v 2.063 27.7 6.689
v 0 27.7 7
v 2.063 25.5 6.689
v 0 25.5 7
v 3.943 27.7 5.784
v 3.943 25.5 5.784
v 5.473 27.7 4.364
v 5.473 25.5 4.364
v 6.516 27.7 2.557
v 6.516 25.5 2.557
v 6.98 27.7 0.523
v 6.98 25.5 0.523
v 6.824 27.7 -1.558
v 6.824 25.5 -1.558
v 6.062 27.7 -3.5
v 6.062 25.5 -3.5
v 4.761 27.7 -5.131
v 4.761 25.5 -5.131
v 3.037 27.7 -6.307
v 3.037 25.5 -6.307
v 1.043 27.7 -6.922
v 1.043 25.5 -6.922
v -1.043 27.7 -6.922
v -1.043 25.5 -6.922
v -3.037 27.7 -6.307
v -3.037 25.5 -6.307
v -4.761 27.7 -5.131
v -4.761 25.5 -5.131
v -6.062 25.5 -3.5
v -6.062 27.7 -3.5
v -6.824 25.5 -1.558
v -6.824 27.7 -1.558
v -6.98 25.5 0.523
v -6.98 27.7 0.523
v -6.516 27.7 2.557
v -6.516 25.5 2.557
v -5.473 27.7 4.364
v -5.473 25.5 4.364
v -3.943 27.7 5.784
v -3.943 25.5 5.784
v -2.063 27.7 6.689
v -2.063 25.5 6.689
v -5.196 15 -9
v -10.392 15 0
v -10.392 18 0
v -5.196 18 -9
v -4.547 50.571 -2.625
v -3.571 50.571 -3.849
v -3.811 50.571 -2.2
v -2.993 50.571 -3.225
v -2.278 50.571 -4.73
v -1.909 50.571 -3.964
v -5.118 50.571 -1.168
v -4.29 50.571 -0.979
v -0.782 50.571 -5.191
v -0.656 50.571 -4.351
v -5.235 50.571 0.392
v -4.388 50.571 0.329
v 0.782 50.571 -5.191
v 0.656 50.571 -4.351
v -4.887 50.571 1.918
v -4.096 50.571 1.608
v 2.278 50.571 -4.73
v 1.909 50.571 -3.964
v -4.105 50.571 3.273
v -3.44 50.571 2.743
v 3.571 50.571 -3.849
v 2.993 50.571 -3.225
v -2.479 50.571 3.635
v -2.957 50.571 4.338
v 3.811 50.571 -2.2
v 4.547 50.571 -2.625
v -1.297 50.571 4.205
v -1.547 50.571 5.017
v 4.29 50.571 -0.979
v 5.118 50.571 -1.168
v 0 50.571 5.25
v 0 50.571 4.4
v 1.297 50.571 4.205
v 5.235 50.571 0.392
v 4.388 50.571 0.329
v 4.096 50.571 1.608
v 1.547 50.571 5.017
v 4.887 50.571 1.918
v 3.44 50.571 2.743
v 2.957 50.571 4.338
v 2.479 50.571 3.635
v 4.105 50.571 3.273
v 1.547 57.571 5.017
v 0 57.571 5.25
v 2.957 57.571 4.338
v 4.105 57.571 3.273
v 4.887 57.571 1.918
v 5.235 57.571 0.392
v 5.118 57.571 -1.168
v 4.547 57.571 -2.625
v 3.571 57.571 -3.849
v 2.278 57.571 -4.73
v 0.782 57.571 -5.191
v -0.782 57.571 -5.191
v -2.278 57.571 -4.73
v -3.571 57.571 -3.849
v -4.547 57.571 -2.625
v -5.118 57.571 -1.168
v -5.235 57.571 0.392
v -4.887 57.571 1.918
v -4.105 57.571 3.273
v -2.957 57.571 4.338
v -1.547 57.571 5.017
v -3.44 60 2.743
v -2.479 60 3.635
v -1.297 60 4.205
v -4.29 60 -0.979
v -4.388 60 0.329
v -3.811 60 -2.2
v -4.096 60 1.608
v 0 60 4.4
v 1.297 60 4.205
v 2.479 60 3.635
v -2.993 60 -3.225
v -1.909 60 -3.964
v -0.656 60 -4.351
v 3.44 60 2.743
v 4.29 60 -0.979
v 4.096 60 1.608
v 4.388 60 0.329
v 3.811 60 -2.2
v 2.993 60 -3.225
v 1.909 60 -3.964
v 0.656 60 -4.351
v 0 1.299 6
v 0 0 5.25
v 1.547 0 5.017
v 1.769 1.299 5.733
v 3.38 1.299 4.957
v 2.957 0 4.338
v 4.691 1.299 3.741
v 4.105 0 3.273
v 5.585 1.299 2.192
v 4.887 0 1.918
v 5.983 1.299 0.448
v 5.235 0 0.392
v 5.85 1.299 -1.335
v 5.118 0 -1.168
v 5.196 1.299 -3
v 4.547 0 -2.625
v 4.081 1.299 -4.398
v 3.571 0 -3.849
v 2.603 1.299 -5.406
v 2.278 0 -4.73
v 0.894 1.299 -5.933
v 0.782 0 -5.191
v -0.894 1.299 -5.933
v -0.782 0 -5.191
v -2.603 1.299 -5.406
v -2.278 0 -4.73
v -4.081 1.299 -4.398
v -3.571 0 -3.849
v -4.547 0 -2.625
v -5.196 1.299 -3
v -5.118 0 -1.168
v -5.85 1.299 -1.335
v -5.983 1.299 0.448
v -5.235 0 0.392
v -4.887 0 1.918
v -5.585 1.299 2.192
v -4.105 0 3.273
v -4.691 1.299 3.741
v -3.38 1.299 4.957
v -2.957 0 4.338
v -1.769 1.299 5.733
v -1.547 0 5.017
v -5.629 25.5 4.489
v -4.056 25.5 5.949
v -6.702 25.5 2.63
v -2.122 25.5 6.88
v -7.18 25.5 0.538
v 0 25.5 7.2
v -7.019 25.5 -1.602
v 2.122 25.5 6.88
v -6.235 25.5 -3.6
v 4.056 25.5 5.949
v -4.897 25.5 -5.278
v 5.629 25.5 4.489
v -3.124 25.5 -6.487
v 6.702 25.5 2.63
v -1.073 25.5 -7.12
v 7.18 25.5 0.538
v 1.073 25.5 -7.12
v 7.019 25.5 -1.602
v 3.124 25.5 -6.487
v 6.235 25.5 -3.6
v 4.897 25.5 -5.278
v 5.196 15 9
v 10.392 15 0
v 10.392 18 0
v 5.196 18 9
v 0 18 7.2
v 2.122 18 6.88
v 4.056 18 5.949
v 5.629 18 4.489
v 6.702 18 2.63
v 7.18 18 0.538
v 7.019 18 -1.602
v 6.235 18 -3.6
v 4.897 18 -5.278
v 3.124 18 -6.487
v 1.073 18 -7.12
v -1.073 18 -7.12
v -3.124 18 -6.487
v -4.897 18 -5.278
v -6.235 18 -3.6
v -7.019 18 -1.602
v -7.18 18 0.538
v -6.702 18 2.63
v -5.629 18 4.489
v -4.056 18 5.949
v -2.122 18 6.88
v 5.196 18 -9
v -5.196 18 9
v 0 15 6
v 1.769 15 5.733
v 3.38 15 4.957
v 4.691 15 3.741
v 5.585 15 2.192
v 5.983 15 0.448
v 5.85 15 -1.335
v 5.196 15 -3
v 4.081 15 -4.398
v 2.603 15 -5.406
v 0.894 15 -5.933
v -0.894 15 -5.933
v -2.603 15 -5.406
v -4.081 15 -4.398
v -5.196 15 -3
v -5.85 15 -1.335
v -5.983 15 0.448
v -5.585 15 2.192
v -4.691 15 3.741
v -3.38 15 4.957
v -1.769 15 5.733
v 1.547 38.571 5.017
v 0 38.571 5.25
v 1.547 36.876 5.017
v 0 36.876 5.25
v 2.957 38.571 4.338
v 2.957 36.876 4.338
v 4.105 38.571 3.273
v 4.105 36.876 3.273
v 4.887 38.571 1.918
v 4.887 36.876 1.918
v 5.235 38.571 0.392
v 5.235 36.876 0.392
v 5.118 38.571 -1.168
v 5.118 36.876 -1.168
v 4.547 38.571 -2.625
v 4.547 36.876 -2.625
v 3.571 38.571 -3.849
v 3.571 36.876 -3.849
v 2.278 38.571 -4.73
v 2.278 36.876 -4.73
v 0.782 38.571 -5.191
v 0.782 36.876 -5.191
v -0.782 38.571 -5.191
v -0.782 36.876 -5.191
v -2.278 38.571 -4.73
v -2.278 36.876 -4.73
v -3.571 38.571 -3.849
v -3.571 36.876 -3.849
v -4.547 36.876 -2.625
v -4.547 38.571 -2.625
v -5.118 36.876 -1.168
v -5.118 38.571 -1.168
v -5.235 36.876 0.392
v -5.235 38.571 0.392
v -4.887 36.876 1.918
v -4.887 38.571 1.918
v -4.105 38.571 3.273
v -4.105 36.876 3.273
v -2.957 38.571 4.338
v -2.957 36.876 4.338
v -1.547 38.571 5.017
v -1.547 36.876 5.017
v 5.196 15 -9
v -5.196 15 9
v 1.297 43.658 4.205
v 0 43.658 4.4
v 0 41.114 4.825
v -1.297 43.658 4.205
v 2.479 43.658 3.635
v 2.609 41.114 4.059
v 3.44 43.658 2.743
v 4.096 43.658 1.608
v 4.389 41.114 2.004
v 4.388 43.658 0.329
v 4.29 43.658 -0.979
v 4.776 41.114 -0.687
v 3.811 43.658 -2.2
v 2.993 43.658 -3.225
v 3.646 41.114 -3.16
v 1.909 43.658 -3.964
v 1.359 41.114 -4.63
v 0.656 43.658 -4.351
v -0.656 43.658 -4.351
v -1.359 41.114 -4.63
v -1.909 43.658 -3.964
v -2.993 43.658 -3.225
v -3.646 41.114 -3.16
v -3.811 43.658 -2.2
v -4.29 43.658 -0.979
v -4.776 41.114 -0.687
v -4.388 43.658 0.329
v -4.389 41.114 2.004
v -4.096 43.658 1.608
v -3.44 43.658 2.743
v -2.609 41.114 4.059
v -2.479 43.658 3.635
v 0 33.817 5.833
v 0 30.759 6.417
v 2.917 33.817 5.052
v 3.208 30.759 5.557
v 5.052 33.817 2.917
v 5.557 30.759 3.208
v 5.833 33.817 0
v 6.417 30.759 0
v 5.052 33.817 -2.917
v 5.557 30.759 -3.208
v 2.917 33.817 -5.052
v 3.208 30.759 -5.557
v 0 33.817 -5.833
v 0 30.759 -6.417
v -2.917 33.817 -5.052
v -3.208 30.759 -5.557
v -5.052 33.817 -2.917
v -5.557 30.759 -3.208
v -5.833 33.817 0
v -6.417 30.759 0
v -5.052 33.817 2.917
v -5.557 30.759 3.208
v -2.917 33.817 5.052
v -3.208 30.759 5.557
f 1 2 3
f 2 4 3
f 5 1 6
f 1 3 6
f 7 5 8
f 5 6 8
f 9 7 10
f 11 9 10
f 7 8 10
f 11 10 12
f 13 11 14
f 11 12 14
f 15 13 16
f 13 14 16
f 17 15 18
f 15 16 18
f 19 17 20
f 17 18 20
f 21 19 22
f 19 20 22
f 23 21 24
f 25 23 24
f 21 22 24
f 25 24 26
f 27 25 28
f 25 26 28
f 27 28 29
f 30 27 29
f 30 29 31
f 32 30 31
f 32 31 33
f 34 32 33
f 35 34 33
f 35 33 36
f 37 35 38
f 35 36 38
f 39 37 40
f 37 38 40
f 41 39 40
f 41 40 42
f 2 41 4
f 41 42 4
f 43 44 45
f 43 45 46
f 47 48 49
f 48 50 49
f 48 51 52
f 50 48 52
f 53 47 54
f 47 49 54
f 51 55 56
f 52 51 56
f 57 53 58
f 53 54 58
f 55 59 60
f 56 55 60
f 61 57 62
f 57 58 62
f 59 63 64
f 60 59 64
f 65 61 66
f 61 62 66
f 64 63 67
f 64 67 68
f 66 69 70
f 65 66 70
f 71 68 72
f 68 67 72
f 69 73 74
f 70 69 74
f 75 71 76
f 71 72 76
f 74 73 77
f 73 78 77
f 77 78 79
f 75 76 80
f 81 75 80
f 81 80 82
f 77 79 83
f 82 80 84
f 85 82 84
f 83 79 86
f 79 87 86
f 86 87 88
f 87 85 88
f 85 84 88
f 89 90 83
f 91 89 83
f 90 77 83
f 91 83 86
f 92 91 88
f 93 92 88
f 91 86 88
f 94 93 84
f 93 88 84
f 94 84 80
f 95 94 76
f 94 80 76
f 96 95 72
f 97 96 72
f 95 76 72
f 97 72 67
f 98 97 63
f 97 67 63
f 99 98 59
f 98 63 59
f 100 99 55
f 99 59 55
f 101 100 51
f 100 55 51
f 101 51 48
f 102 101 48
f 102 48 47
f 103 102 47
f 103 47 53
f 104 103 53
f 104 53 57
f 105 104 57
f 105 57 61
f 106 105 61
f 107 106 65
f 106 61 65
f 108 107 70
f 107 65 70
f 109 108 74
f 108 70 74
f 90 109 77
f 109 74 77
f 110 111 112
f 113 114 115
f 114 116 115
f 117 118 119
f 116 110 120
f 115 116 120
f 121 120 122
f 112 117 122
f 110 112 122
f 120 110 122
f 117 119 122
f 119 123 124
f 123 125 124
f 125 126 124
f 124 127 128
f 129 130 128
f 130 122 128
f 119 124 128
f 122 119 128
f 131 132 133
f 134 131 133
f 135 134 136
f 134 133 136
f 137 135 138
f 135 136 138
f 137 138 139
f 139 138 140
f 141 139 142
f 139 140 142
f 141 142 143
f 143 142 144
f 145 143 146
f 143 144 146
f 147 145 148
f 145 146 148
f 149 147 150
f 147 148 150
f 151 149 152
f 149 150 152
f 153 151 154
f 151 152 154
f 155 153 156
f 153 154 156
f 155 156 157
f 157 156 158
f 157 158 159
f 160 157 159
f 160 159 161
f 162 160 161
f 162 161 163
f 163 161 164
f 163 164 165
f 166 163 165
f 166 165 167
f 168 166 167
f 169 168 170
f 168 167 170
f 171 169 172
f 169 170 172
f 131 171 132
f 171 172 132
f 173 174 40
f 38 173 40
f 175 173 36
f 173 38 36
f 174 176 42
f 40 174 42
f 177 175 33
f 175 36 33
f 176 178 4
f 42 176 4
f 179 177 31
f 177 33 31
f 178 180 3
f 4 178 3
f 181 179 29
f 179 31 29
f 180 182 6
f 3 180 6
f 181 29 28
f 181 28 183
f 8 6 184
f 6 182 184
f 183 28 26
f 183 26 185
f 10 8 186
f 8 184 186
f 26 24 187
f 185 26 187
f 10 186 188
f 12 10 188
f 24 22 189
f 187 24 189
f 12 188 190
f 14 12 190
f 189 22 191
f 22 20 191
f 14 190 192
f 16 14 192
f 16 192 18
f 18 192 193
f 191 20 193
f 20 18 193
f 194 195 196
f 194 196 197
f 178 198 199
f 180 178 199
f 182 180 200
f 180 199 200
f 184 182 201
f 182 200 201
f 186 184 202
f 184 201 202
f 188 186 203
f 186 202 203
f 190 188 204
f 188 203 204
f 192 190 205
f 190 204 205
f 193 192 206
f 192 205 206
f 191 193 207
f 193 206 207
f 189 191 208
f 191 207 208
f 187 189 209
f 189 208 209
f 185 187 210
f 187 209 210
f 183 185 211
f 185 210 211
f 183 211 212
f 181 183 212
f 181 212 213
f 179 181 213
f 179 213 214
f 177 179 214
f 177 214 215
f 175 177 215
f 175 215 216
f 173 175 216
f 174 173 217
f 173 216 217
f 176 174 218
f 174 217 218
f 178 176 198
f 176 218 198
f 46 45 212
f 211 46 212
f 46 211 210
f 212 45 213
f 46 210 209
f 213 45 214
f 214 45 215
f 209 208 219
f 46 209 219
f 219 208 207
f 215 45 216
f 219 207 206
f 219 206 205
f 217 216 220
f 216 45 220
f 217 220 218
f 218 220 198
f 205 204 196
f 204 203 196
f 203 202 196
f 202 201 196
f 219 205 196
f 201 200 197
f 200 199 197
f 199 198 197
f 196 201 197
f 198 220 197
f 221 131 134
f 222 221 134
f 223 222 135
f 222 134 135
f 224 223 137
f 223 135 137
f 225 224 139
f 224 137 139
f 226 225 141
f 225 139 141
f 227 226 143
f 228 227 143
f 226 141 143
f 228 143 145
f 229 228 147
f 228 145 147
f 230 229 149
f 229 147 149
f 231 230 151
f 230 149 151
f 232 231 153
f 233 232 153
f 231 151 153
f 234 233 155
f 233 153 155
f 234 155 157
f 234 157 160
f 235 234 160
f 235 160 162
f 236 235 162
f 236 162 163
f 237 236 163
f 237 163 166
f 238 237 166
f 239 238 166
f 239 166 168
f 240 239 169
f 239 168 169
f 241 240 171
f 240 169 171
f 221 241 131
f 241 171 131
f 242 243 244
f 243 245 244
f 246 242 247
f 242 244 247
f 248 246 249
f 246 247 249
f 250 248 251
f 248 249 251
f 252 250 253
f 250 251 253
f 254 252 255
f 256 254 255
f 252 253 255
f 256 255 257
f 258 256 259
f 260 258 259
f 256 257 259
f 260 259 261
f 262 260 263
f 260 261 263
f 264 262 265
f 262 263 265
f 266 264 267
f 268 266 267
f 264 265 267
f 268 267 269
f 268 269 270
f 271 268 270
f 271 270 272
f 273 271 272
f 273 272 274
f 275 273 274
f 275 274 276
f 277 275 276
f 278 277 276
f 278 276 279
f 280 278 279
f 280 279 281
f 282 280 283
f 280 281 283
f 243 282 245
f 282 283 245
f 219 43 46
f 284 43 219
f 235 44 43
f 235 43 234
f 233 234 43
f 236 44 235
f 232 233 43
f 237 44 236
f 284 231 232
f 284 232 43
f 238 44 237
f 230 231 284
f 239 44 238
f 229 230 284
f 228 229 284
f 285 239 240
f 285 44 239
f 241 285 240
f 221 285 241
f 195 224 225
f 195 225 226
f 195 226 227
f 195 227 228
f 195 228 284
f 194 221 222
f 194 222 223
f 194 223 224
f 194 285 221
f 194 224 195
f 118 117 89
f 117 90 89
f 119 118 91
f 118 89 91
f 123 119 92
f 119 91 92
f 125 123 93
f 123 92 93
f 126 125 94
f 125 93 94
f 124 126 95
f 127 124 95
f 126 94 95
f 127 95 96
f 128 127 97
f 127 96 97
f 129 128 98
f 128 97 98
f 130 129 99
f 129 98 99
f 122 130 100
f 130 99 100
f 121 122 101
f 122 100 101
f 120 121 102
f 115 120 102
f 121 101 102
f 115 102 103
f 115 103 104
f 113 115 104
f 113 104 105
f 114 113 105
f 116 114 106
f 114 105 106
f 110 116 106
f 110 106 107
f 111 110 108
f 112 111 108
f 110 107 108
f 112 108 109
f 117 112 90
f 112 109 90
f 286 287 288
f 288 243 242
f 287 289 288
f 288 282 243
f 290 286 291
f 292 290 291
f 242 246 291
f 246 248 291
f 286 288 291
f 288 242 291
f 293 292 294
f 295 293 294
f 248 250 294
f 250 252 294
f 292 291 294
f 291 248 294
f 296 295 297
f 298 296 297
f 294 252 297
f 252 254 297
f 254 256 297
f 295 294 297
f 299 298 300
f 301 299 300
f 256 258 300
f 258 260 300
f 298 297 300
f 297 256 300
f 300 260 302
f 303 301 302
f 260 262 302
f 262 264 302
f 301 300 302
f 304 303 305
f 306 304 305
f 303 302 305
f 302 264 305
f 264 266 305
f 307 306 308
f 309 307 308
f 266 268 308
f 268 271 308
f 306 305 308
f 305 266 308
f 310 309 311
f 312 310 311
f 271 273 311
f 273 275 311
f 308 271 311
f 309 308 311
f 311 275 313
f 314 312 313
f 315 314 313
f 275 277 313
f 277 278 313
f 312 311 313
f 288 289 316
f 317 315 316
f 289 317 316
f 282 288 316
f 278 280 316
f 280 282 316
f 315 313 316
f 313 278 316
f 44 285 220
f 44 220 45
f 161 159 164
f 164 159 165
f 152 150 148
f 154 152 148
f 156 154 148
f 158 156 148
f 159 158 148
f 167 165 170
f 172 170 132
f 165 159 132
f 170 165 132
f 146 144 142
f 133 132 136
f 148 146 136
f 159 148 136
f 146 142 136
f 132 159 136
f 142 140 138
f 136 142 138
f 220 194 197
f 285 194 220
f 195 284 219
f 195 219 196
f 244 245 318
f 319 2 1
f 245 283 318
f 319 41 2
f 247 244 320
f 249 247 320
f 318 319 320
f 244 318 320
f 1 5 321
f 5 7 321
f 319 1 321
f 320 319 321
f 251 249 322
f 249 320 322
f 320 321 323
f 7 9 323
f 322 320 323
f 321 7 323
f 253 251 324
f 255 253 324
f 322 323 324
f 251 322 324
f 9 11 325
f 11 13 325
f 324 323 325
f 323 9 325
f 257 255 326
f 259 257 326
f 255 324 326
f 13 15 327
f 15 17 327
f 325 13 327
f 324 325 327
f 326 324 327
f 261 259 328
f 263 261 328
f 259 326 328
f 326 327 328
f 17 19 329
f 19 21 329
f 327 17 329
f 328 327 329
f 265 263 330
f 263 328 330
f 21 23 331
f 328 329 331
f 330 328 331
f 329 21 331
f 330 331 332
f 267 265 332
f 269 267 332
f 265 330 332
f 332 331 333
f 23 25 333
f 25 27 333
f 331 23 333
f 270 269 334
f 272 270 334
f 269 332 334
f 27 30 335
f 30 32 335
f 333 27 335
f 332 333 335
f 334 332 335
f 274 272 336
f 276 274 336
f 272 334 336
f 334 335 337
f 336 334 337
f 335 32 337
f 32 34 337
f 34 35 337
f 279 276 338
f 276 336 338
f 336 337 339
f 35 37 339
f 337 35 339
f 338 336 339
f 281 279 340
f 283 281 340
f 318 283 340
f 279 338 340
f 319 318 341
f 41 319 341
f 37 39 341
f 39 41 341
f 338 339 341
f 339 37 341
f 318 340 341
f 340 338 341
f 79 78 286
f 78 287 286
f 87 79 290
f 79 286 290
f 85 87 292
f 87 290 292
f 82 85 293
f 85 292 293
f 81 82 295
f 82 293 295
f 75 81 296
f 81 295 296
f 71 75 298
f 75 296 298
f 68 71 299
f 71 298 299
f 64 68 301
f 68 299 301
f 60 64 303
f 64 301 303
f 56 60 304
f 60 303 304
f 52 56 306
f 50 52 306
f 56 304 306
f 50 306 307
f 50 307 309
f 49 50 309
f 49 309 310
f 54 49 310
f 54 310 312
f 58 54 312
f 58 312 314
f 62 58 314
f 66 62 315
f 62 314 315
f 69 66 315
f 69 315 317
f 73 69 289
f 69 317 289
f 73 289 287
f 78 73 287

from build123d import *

# Parameters (mm, degrees)
F3_R     = 7.2
F4_DEPTH = 3
F5_SIZE2 = 0.75
F5_SIZE  = 1.2990381057


with BuildPart() as f2:
    # F0 (on Right) → F2 (revolve)
    with BuildSketch(Plane.YZ):
        Polygon((0, 6), (0, 0), (60, 0), (60, 4.4), (57.5712198913, 5.25), (50.5712198913, 5.25), (50.5712198913, 4.4), (43.6577536166, 4.4), (38.5712198913, 5.25), (36.8757098913, 5.25), (27.7, 7), (25.5, 7), (25.5, 7.2), (15, 7.2), (15, 6), align=None)
    revolve(axis=Axis((0, -0.2503991127, 0), (0, 1, 0)))

    # F3 (on face) → F4 (join)
    with BuildSketch(Plane.XZ.offset(-15)):
        Polygon((5.1961524227, 9), (-5.1961524227, 9), (-10.3923048454, 0), (-5.1961524227, -9), (5.1961524227, -9), (10.3923048454, 0), align=None)
        Circle(F3_R, mode=Mode.SUBTRACT)
    extrude(amount=-F4_DEPTH)

    # F5
    f5_edges = [f2.edges().sort_by_distance(p)[0] for p in [
        (0, 0, -6),
    ]]
    f5_side = f2.faces().sort_by_distance((0, 7.5, -6))[0]
    chamfer(f5_edges, length=F5_SIZE, length2=F5_SIZE2, reference=f5_side)


solid = f2.part
